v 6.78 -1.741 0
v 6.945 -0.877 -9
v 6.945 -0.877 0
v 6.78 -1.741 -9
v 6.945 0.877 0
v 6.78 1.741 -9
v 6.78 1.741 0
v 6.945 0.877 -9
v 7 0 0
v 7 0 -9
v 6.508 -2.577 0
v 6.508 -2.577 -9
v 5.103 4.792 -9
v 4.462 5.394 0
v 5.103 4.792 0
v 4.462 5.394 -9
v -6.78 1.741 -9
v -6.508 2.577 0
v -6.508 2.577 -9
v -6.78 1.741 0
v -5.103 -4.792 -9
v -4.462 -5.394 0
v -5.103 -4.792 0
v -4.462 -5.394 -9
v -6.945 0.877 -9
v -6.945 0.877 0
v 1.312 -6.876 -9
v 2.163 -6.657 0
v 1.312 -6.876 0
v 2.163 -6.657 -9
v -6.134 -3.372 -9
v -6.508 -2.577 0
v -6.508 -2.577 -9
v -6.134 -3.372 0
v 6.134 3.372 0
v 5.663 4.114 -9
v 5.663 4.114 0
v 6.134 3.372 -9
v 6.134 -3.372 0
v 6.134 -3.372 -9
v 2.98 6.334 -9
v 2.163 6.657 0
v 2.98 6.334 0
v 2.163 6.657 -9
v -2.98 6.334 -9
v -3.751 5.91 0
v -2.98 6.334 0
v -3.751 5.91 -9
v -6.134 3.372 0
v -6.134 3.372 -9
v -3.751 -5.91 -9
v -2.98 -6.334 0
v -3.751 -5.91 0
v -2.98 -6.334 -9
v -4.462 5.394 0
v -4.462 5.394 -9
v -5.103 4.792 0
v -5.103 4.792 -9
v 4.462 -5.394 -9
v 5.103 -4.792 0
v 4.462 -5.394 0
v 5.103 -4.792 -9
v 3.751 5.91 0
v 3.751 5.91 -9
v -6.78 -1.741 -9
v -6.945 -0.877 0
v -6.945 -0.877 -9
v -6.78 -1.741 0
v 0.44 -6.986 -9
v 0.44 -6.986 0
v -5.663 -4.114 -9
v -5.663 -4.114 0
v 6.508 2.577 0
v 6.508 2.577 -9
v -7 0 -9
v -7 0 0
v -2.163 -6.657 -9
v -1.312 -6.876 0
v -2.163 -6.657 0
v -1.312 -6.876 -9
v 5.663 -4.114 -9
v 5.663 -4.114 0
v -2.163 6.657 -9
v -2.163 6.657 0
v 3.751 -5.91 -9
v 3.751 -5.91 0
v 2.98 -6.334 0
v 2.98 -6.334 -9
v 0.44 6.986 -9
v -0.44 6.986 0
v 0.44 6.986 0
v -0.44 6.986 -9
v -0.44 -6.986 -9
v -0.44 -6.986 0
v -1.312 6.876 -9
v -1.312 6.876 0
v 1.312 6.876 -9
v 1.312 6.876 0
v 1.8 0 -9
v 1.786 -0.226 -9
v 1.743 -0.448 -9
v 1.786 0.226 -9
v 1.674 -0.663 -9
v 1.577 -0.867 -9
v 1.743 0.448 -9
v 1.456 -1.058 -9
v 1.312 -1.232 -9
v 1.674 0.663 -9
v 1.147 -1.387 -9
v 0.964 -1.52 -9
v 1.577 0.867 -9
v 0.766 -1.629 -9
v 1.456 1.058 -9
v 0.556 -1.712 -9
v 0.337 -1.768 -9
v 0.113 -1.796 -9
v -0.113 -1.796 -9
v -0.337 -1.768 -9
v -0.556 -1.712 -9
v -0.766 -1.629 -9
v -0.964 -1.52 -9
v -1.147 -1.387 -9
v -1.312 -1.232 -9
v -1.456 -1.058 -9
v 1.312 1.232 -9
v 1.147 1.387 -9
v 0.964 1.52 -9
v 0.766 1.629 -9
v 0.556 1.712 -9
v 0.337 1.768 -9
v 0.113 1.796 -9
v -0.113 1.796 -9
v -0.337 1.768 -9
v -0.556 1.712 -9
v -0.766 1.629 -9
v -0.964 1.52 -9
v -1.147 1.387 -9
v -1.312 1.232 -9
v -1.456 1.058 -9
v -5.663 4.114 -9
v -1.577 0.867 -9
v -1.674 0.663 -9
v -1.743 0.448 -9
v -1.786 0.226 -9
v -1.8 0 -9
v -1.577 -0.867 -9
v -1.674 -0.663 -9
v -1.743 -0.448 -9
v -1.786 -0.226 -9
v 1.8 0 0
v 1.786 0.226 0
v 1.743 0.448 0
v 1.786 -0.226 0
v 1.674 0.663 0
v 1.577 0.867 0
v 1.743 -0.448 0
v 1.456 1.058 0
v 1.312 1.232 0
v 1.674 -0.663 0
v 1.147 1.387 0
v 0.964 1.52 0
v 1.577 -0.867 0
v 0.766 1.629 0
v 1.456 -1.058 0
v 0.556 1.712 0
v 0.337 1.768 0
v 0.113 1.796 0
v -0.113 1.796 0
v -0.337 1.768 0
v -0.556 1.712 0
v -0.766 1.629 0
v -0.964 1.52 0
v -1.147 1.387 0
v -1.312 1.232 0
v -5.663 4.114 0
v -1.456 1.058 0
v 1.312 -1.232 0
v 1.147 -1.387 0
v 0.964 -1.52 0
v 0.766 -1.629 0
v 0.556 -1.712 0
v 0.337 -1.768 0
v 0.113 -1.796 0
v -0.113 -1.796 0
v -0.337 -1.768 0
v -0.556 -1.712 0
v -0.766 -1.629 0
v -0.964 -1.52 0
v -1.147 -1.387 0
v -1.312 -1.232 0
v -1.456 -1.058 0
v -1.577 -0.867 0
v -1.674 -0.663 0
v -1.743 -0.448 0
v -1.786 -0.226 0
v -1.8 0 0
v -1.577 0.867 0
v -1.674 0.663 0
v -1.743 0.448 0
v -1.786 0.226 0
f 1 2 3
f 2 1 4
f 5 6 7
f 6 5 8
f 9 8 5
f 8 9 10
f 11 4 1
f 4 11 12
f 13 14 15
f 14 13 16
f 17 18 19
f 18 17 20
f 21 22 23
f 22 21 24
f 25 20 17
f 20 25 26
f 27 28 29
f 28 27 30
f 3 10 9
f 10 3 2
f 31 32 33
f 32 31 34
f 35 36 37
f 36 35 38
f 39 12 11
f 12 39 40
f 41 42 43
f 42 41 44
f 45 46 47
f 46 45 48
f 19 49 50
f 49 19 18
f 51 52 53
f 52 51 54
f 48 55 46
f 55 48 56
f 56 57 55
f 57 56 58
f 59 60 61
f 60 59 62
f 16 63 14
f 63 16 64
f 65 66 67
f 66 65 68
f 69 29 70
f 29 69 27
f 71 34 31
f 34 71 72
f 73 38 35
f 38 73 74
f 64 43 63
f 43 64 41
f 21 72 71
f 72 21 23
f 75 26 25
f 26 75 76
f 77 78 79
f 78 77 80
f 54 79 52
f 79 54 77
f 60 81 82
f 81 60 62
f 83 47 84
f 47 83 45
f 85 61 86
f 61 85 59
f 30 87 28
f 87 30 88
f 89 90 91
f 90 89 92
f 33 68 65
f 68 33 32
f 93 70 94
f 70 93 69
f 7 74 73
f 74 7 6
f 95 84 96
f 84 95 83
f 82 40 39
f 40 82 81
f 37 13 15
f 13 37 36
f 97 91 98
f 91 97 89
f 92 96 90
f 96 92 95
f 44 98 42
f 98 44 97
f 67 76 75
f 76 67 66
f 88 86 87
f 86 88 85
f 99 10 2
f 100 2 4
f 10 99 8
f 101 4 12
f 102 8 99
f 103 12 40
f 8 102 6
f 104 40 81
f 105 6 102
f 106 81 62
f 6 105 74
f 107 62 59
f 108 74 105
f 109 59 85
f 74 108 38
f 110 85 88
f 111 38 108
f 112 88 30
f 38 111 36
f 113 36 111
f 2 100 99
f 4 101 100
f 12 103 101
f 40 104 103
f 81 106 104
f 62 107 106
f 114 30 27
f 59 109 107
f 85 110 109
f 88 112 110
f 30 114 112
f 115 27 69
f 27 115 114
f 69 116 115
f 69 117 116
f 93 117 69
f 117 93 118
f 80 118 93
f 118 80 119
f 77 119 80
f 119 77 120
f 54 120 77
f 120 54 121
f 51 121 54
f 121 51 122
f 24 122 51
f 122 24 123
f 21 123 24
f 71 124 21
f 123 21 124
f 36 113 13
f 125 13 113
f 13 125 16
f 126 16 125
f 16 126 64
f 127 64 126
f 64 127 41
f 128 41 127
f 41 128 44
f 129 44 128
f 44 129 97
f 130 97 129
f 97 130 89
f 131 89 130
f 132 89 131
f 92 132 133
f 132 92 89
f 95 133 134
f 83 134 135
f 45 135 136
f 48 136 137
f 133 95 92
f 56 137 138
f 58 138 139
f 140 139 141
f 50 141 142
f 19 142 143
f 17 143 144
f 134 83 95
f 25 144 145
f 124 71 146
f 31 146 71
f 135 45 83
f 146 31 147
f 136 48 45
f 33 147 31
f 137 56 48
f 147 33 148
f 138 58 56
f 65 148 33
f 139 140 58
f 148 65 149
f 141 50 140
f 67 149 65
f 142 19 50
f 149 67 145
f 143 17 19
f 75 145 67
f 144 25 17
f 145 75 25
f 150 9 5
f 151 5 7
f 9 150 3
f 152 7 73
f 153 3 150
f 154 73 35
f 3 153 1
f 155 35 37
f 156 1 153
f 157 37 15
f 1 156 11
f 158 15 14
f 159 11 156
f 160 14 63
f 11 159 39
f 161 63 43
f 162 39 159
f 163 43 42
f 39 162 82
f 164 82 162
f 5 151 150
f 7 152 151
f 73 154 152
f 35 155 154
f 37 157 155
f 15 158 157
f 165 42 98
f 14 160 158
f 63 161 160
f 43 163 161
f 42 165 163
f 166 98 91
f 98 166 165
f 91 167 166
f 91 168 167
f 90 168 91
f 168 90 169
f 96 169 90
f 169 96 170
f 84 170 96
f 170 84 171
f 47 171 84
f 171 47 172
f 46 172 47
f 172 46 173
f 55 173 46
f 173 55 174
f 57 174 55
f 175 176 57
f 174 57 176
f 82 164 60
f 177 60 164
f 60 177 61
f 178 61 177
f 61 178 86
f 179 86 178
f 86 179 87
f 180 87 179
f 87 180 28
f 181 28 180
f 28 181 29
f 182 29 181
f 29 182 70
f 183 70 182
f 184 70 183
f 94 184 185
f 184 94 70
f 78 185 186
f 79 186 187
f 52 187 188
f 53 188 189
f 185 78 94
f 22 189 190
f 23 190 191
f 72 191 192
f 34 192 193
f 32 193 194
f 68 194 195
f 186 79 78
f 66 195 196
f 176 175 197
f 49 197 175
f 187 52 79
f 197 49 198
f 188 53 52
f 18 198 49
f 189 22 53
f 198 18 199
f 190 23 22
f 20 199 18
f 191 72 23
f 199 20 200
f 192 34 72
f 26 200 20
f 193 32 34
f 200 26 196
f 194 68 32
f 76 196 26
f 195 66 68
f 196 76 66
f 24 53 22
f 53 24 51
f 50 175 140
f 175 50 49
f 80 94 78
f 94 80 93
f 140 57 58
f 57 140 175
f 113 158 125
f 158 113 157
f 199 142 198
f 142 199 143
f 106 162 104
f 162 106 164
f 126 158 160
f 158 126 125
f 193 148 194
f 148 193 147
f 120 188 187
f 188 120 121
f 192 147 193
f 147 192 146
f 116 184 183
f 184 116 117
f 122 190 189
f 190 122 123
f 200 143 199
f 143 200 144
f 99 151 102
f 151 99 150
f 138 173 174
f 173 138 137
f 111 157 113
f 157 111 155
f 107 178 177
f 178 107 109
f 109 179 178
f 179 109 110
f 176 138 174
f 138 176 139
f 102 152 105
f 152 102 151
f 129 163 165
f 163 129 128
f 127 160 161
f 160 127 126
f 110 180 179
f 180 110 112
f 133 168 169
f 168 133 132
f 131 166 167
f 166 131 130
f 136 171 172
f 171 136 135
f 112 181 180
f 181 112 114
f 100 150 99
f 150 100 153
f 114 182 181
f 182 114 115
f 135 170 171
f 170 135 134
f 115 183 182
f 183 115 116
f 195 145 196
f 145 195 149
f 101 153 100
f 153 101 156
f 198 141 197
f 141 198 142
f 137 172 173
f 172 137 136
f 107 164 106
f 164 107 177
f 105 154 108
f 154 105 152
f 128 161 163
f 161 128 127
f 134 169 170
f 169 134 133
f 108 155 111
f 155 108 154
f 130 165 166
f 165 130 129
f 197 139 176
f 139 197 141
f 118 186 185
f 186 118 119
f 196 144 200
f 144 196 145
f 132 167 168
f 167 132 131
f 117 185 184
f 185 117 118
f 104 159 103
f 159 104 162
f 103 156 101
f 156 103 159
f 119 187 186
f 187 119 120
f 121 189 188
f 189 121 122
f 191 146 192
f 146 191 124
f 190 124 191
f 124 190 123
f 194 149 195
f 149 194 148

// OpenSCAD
$fn = 50;


difference() {
	union() {
		translate(v = [0, 0, -9.0000000000]) {
			cylinder(h = 9, r = 7.0000000000);
		}
		cylinder(h = 0, r = 10.0000000000);
	}
	union() {
		#translate(v = [0, 0, -9]) {
			cylinder(h = 9, r = 1.8000000000);
		}
	}
}
